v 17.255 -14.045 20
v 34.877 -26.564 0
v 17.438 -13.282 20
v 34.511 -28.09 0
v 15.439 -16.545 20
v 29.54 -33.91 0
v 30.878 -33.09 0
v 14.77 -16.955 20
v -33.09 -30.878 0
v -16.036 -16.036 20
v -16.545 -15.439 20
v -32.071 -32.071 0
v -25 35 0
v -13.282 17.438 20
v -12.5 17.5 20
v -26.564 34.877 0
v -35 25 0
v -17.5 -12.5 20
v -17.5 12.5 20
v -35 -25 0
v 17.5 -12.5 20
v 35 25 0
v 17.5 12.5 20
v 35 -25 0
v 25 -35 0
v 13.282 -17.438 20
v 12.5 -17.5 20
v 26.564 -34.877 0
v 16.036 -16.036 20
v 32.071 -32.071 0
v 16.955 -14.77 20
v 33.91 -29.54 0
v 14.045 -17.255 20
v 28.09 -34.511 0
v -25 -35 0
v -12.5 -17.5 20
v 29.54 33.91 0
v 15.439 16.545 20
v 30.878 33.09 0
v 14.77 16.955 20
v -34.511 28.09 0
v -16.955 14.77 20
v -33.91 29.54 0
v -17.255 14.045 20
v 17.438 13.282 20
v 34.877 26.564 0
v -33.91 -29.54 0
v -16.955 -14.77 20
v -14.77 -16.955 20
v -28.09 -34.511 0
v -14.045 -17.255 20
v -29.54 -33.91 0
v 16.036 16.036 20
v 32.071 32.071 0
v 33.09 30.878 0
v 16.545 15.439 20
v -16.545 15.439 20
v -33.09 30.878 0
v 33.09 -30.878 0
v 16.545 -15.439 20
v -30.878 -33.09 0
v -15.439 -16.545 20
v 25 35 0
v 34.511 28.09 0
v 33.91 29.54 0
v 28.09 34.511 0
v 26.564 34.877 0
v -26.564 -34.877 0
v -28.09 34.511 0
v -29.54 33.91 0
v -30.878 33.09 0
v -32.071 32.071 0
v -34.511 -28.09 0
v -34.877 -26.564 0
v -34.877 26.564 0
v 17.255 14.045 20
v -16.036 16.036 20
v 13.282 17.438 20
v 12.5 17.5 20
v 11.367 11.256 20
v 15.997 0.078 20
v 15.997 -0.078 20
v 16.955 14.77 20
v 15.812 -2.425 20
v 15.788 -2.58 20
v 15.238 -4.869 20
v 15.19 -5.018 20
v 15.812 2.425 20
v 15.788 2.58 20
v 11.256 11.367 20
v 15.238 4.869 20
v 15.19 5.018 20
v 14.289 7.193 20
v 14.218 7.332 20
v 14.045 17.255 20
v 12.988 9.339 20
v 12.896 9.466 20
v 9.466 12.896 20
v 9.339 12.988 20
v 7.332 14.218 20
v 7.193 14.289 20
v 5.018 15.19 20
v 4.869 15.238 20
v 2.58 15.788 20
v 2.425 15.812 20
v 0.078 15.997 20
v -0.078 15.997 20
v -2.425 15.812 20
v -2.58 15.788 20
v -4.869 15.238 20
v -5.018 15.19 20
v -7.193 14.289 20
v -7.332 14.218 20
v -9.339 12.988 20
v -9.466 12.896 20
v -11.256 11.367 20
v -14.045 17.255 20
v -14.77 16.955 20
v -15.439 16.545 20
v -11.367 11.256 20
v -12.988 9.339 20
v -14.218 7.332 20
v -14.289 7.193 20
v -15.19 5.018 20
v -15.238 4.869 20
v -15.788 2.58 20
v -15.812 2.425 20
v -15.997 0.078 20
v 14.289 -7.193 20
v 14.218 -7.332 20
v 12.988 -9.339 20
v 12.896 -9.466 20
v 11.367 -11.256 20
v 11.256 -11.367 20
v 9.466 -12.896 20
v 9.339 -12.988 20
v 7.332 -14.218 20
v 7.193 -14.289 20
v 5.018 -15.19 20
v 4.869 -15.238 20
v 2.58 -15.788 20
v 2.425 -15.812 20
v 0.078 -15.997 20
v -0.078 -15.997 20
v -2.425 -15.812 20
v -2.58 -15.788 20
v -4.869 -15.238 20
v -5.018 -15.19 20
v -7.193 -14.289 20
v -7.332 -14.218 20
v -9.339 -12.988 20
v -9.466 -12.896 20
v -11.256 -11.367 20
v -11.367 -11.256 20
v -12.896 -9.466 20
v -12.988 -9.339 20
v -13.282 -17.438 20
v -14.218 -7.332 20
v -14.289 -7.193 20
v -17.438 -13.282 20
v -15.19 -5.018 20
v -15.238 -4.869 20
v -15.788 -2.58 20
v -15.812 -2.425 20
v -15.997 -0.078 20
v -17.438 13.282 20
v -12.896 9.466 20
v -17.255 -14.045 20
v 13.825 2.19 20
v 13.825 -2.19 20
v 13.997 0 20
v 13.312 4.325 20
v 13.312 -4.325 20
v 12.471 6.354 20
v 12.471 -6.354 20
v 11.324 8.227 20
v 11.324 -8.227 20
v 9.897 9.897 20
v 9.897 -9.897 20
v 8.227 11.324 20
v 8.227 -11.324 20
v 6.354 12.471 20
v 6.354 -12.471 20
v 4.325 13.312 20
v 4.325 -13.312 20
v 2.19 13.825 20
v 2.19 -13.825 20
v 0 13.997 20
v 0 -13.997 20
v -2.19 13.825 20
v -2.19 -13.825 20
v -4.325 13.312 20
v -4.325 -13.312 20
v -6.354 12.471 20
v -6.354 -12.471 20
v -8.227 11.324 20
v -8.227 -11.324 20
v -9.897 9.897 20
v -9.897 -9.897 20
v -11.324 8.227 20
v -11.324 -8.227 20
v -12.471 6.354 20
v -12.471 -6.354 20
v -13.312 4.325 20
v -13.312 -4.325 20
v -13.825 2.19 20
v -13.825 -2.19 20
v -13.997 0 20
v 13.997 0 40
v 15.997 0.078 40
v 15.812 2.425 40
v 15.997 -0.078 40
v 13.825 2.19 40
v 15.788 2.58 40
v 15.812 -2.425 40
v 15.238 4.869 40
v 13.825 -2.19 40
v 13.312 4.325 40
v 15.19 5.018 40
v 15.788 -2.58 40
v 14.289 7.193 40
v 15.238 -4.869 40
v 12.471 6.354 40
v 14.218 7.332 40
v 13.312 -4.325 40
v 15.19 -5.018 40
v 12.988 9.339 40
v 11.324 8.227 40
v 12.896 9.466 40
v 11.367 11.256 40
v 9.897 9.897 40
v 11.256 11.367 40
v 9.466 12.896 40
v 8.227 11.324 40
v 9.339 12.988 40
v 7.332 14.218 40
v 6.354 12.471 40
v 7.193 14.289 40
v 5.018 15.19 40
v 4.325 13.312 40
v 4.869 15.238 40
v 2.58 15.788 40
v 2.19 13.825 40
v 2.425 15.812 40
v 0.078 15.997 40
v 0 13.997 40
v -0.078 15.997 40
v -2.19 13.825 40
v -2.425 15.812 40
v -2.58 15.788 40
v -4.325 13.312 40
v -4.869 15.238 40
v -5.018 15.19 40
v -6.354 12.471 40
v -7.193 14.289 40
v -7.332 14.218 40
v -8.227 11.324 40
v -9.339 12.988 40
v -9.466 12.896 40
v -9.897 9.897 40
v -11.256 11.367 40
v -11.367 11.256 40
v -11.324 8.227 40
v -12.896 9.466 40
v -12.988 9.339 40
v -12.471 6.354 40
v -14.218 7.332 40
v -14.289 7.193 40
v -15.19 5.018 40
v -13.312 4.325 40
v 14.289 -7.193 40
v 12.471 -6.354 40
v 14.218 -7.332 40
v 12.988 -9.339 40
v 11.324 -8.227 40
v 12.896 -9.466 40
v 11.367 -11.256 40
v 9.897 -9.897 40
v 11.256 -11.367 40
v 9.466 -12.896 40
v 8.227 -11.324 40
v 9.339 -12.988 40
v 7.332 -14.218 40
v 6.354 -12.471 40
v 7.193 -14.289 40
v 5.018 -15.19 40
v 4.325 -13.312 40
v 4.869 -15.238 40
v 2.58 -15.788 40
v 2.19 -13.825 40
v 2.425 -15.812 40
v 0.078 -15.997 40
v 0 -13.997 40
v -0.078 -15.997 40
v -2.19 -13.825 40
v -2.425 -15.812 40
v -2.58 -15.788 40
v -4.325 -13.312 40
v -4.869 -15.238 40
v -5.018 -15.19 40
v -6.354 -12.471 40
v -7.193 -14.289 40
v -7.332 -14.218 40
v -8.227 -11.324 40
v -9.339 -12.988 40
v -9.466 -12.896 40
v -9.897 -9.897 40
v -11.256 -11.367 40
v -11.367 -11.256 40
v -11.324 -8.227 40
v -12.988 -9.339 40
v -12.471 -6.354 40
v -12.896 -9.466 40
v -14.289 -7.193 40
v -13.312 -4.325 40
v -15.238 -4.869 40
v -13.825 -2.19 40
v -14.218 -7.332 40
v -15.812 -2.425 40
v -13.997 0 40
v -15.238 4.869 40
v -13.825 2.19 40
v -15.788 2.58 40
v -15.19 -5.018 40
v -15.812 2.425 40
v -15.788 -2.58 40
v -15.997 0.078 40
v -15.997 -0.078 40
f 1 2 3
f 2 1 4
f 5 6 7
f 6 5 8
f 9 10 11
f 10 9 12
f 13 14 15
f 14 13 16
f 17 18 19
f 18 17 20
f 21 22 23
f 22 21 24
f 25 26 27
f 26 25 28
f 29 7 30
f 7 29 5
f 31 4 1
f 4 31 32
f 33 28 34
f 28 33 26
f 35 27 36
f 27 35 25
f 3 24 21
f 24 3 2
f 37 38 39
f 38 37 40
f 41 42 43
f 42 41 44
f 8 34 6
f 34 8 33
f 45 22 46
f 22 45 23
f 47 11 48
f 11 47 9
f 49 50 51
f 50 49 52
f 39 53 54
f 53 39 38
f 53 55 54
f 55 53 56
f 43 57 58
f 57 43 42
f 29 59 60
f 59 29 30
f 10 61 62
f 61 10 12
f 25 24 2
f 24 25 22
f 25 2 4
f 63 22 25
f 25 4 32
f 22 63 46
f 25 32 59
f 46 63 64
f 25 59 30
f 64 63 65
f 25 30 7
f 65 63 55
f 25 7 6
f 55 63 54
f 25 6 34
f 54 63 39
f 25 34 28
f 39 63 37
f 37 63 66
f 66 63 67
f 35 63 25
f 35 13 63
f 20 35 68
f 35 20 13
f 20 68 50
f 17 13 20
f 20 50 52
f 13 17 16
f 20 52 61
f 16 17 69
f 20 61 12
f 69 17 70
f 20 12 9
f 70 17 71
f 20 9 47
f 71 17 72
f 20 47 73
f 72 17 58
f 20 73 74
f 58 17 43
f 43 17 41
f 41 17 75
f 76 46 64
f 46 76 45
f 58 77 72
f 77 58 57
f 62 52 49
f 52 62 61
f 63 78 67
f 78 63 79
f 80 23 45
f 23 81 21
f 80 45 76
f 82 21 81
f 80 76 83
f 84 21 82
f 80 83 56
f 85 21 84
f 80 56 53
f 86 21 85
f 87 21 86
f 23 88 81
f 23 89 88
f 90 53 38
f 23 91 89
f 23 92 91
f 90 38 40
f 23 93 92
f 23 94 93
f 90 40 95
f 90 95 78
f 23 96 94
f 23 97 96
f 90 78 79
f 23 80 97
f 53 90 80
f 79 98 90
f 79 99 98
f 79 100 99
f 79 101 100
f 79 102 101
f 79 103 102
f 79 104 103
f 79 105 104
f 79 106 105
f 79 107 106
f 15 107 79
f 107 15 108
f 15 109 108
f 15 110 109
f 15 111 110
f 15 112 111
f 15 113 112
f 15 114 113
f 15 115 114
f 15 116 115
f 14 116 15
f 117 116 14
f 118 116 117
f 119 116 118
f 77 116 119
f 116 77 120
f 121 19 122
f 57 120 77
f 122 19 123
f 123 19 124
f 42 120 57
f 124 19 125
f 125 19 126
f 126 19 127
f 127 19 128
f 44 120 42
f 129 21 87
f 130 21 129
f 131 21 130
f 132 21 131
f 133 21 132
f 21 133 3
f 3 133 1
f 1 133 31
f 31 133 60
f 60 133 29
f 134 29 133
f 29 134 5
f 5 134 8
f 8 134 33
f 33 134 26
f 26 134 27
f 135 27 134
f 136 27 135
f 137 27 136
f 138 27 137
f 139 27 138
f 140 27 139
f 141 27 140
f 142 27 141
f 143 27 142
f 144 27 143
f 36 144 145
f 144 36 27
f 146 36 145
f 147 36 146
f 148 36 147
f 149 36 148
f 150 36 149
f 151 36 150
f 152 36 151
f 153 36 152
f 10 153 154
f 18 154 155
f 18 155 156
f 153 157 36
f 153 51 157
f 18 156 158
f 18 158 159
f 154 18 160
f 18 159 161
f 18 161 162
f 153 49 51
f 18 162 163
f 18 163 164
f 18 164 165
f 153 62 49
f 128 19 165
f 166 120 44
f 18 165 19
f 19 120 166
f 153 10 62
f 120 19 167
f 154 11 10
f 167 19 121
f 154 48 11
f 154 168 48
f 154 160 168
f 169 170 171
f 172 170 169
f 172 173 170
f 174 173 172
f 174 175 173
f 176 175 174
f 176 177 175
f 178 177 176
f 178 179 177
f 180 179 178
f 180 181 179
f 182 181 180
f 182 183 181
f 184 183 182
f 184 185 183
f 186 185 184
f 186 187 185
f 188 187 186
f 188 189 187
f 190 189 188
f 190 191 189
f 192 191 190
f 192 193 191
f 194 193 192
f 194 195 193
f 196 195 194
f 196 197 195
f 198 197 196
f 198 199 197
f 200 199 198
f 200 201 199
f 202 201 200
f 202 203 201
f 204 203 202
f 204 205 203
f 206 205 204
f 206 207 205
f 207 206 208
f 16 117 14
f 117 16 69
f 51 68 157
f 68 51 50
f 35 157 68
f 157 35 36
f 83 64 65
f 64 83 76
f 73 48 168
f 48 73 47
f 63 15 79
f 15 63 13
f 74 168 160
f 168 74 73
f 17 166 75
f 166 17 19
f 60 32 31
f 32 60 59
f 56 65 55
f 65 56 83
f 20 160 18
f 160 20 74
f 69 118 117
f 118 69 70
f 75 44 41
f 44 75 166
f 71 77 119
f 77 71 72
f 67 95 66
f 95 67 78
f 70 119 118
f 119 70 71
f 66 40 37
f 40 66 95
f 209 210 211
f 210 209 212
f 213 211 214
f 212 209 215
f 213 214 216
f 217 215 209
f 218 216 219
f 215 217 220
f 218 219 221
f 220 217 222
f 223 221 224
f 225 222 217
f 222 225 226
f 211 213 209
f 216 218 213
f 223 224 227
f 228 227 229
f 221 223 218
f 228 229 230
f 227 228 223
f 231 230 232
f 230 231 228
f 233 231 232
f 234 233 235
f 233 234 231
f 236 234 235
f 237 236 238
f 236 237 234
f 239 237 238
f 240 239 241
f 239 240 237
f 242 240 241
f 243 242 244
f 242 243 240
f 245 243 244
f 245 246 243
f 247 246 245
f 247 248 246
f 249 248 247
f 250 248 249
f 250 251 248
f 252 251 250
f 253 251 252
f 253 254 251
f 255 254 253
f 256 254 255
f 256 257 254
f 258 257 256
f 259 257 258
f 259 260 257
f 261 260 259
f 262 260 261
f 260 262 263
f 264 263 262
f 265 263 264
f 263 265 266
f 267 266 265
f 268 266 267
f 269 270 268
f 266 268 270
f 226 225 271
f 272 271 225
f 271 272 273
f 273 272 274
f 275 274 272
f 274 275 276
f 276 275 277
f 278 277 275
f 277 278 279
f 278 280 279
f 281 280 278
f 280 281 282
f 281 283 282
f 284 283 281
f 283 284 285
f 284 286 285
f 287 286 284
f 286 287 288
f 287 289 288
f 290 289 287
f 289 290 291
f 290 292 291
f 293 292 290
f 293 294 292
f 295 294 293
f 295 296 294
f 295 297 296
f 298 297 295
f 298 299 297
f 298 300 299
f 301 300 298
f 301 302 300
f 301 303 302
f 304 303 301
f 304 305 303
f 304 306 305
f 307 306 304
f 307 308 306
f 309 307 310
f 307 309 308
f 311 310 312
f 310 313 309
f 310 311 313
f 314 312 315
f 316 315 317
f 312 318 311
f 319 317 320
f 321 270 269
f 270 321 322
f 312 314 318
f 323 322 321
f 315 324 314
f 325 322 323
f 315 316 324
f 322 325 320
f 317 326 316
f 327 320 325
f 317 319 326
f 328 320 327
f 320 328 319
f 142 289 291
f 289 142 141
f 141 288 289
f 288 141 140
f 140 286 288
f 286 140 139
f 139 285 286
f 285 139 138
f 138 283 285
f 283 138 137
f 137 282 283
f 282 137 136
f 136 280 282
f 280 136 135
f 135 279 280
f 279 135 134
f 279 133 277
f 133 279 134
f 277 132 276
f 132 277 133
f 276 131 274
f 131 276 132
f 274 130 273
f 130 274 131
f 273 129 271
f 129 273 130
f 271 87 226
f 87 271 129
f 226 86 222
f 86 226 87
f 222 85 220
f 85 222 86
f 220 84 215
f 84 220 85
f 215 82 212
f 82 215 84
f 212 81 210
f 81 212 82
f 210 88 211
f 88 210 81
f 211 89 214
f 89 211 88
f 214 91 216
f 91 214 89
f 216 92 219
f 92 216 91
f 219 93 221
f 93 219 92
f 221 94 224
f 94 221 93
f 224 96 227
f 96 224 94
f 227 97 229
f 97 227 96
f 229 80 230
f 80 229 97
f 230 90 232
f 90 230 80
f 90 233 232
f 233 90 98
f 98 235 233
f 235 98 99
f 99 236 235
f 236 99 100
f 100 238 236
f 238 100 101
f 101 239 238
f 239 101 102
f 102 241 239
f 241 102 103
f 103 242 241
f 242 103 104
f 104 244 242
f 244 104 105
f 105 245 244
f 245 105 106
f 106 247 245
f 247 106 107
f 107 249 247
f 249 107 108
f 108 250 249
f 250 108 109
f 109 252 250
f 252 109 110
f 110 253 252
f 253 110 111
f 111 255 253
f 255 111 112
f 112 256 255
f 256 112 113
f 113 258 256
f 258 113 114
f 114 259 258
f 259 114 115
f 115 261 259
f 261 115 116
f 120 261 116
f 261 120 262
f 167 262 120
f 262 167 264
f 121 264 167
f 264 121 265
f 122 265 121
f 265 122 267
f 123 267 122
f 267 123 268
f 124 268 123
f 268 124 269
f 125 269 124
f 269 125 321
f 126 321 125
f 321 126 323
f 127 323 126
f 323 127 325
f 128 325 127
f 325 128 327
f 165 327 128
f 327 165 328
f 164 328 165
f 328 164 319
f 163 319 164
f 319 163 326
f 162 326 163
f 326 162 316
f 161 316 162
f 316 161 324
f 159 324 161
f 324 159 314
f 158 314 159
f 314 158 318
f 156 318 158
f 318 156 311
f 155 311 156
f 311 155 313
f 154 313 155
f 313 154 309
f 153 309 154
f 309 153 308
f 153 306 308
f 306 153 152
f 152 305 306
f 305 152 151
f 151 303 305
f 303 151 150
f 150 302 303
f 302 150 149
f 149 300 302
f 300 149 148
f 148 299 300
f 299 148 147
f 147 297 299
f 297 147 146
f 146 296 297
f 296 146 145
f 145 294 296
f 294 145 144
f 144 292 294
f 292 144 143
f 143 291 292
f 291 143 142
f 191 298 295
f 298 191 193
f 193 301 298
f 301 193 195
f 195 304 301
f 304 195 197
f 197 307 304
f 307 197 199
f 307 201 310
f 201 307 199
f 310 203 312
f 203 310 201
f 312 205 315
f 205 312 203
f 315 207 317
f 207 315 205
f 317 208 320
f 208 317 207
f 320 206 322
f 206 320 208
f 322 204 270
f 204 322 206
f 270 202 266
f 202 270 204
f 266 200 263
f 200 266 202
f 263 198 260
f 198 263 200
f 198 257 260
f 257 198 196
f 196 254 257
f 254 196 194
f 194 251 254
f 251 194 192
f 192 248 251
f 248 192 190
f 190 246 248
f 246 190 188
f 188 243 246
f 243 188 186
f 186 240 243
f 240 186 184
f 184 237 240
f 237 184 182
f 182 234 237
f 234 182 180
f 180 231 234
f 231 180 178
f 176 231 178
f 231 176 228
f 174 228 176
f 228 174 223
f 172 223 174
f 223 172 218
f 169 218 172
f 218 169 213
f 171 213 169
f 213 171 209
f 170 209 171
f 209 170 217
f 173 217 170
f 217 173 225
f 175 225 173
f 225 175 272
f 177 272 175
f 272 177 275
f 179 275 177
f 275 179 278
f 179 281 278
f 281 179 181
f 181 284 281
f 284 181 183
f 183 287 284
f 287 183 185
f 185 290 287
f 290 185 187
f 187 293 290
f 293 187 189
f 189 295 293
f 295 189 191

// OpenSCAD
// Example for offset() usage
// (c) 2014 Torsten Paul
// CC-BY-SA 4.0

$fn = 40;

foot_height = 20;

echo(version=version());

module outline(wall = 1) {
	difference() {
		offset(wall / 2) children();
		offset(-wall / 2) children();
	}
}

// offsetting with a positive value and join_type = "round"
// allows to create rounded corners easily
linear_extrude(height = foot_height, scale = 0.5) {
  offset(10, join_type = "round") {
    square(50, center = true);
  }
}

translate([0, 0, foot_height]) {
	linear_extrude(height = 20) {
		outline(wall = 2) circle(15);
	}
}

%cylinder(r = 14, h = 100);
%translate([0, 0, 100]) sphere(r = 30);
